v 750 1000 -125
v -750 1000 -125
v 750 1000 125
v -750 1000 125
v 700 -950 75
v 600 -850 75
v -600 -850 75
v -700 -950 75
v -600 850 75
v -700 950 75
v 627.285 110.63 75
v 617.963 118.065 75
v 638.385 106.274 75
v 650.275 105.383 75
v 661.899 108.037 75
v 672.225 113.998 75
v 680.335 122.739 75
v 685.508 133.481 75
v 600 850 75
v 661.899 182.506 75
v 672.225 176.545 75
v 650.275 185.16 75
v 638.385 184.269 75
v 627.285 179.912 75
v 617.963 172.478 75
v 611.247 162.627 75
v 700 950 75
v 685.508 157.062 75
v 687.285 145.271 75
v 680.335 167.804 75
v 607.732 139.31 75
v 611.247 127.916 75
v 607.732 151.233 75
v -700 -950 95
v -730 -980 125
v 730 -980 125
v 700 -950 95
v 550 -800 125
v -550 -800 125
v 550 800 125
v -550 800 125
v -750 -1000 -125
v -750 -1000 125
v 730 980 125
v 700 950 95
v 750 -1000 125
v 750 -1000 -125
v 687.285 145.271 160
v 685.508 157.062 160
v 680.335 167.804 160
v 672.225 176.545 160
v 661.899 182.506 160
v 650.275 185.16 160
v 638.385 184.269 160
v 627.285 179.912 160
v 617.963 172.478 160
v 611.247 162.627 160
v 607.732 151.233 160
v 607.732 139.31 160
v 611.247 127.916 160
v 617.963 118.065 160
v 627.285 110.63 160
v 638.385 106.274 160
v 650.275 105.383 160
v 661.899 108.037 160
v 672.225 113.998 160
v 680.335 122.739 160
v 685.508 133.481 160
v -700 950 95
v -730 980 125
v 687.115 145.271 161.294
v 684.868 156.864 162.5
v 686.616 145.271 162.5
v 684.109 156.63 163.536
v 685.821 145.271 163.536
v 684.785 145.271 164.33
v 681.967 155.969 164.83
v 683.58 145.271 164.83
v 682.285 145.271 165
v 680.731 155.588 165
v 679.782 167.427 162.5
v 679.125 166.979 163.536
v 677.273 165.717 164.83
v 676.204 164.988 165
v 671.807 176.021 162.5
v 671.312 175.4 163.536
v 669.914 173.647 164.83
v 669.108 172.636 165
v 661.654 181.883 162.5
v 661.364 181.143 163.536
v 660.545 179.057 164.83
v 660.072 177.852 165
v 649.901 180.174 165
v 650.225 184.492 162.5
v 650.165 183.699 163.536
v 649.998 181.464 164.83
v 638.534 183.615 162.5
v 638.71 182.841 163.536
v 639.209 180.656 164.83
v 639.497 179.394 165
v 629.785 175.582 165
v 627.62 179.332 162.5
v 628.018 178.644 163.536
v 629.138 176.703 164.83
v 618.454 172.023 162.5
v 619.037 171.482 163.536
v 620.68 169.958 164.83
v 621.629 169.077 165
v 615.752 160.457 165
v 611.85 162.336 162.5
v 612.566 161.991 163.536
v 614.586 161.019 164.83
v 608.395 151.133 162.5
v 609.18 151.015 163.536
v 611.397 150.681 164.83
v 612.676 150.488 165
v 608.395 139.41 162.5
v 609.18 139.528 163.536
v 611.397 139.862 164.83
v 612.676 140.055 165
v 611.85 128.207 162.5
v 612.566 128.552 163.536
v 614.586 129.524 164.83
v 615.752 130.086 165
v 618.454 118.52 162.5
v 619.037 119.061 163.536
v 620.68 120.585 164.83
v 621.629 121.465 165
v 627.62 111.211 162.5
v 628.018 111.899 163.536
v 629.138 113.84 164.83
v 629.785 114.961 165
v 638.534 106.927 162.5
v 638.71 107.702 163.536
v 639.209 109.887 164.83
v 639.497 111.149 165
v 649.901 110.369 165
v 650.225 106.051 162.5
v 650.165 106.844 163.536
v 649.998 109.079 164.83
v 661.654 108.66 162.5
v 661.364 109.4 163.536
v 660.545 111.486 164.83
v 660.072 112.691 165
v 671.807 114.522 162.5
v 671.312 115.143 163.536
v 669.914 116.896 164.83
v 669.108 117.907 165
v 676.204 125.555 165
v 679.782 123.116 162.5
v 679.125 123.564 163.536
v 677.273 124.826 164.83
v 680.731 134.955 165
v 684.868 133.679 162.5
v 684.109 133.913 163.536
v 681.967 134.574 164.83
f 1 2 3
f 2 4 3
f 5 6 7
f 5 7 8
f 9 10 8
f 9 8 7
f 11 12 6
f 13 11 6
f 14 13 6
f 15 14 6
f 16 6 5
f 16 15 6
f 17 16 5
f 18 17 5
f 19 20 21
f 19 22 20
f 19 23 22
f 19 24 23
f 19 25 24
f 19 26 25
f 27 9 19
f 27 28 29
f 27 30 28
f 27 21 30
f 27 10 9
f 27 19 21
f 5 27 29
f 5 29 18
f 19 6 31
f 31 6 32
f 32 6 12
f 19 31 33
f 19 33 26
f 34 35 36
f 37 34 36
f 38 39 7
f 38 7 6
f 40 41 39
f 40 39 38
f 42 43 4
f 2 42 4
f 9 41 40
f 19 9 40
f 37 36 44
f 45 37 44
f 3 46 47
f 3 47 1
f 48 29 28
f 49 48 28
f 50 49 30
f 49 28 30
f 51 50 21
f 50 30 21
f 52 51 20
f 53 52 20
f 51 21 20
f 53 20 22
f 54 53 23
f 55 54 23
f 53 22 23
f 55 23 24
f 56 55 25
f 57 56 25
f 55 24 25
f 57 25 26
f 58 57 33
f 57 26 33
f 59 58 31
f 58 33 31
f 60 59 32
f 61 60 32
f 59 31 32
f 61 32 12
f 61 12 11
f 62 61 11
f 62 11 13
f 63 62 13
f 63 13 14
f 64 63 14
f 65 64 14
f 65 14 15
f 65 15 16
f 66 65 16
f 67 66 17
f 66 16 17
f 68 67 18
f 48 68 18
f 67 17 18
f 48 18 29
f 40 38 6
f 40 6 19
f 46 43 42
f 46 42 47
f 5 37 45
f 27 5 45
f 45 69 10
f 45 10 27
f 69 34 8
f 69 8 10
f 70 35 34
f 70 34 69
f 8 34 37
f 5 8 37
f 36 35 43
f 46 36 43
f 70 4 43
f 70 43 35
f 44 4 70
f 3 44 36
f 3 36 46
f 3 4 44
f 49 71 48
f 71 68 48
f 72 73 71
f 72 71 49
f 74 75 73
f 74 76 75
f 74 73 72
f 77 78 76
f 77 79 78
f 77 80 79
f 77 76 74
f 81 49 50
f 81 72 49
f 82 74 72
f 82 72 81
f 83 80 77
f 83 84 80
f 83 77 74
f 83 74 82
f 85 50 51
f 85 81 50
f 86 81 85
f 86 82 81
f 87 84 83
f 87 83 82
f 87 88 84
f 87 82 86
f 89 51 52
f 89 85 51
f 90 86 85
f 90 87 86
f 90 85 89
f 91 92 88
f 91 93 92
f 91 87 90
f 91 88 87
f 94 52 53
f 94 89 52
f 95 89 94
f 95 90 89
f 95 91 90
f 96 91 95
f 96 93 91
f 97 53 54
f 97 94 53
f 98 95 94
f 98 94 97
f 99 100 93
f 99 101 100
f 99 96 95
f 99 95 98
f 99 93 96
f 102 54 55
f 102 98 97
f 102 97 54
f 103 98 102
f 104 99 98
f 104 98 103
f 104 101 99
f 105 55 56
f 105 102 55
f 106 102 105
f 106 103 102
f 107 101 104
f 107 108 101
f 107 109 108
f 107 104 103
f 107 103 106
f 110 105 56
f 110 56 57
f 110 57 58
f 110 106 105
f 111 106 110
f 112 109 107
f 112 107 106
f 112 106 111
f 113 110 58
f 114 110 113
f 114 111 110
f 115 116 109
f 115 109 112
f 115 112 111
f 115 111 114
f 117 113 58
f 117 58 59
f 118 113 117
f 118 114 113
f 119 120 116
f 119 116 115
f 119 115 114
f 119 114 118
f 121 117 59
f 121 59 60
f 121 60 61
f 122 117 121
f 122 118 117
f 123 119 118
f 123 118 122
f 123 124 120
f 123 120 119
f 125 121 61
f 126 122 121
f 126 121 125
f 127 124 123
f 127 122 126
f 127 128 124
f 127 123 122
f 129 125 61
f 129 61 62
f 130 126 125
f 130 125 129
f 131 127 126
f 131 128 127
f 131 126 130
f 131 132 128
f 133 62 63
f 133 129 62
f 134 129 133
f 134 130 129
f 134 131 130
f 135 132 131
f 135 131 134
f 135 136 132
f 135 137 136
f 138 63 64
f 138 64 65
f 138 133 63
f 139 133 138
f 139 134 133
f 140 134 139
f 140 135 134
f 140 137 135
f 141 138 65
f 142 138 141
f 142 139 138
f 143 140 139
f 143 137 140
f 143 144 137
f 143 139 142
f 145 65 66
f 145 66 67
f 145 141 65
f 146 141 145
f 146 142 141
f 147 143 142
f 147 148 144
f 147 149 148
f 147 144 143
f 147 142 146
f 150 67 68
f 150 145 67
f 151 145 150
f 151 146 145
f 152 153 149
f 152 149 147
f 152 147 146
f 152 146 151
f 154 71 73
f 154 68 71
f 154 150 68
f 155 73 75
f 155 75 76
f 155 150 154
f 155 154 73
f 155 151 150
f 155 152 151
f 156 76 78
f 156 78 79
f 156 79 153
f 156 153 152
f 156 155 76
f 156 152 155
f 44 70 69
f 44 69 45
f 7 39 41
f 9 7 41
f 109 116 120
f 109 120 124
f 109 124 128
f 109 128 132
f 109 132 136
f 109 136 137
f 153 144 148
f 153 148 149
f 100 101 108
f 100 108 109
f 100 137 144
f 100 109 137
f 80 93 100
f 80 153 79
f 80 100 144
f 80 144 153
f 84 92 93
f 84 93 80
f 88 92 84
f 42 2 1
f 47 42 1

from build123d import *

# Parameters (mm, degrees)
F0_W     = 1500
F0_H     = 2000
F0_W_2   = 1400
F0_H_2   = 1900
F0_W_3   = 1200
F0_H_3   = 1700
F1_DEPTH = 125
F2_W     = 1400
F2_H     = 1900
F2_W_2   = 1200
F2_H_2   = 1700
F3_DEPTH = 50
F4_SIZE  = 49.99999
F5_SIZE  = 30
F6_R     = 40
F7_DEPTH = 90
F8_R     = 5


# Not quite as in the source:
# - a fillet or chamfer is up to 0.001 mm smaller than in the source, because OpenCascade refuses the exact size


with BuildPart() as f1:
    # F0 (on Top) → F1 (new body, symmetric)
    with BuildSketch(Plane.XY):
        Rectangle(F0_W, F0_H)
        Rectangle(F0_W_2, F0_H_2, mode=Mode.SUBTRACT)
        Rectangle(F0_W_2, F0_H_2)
        Rectangle(F0_W_3, F0_H_3, mode=Mode.SUBTRACT)
        Rectangle(F0_W_3, F0_H_3)
    extrude(amount=F1_DEPTH, both=True)

    # F2 (on face) → F3 (cut)
    with BuildSketch(Plane.XY.offset(125)):
        Rectangle(F2_W, F2_H)
        Rectangle(F2_W_2, F2_H_2, mode=Mode.SUBTRACT)
    extrude(amount=-F3_DEPTH, mode=Mode.SUBTRACT)

    # F4 (size 50 in the source; OpenCascade refuses exactly that, so slightly less here)
    f4_edges = [f1.edges().sort_by_distance(p)[0] for p in [
        (-600, 0, 125),
        (0, 850, 125),
        (600, 0, 125),
        (0, -850, 125),
    ]]
    chamfer(f4_edges, length=F4_SIZE)

    # F5
    f5_edges = [f1.edges().sort_by_distance(p)[0] for p in [
        (-700, 0, 125),
        (0, 950, 125),
        (700, 0, 125),
        (0, -950, 125),
    ]]
    chamfer(f5_edges, length=F5_SIZE)

    # F6 (on face) → F7 (join)
    with BuildSketch(Plane.XY.offset(75)):
        with Locations((647.2854614258, 145.2714502811)):
            Circle(F6_R)
    extrude(amount=F7_DEPTH)

    # F8
    f8_edges = [f1.edges().sort_by_distance(p)[0] for p in [
        (607.285461, 145.27145, 165),
    ]]
    fillet(f8_edges, radius=F8_R)


solid = f1.part
